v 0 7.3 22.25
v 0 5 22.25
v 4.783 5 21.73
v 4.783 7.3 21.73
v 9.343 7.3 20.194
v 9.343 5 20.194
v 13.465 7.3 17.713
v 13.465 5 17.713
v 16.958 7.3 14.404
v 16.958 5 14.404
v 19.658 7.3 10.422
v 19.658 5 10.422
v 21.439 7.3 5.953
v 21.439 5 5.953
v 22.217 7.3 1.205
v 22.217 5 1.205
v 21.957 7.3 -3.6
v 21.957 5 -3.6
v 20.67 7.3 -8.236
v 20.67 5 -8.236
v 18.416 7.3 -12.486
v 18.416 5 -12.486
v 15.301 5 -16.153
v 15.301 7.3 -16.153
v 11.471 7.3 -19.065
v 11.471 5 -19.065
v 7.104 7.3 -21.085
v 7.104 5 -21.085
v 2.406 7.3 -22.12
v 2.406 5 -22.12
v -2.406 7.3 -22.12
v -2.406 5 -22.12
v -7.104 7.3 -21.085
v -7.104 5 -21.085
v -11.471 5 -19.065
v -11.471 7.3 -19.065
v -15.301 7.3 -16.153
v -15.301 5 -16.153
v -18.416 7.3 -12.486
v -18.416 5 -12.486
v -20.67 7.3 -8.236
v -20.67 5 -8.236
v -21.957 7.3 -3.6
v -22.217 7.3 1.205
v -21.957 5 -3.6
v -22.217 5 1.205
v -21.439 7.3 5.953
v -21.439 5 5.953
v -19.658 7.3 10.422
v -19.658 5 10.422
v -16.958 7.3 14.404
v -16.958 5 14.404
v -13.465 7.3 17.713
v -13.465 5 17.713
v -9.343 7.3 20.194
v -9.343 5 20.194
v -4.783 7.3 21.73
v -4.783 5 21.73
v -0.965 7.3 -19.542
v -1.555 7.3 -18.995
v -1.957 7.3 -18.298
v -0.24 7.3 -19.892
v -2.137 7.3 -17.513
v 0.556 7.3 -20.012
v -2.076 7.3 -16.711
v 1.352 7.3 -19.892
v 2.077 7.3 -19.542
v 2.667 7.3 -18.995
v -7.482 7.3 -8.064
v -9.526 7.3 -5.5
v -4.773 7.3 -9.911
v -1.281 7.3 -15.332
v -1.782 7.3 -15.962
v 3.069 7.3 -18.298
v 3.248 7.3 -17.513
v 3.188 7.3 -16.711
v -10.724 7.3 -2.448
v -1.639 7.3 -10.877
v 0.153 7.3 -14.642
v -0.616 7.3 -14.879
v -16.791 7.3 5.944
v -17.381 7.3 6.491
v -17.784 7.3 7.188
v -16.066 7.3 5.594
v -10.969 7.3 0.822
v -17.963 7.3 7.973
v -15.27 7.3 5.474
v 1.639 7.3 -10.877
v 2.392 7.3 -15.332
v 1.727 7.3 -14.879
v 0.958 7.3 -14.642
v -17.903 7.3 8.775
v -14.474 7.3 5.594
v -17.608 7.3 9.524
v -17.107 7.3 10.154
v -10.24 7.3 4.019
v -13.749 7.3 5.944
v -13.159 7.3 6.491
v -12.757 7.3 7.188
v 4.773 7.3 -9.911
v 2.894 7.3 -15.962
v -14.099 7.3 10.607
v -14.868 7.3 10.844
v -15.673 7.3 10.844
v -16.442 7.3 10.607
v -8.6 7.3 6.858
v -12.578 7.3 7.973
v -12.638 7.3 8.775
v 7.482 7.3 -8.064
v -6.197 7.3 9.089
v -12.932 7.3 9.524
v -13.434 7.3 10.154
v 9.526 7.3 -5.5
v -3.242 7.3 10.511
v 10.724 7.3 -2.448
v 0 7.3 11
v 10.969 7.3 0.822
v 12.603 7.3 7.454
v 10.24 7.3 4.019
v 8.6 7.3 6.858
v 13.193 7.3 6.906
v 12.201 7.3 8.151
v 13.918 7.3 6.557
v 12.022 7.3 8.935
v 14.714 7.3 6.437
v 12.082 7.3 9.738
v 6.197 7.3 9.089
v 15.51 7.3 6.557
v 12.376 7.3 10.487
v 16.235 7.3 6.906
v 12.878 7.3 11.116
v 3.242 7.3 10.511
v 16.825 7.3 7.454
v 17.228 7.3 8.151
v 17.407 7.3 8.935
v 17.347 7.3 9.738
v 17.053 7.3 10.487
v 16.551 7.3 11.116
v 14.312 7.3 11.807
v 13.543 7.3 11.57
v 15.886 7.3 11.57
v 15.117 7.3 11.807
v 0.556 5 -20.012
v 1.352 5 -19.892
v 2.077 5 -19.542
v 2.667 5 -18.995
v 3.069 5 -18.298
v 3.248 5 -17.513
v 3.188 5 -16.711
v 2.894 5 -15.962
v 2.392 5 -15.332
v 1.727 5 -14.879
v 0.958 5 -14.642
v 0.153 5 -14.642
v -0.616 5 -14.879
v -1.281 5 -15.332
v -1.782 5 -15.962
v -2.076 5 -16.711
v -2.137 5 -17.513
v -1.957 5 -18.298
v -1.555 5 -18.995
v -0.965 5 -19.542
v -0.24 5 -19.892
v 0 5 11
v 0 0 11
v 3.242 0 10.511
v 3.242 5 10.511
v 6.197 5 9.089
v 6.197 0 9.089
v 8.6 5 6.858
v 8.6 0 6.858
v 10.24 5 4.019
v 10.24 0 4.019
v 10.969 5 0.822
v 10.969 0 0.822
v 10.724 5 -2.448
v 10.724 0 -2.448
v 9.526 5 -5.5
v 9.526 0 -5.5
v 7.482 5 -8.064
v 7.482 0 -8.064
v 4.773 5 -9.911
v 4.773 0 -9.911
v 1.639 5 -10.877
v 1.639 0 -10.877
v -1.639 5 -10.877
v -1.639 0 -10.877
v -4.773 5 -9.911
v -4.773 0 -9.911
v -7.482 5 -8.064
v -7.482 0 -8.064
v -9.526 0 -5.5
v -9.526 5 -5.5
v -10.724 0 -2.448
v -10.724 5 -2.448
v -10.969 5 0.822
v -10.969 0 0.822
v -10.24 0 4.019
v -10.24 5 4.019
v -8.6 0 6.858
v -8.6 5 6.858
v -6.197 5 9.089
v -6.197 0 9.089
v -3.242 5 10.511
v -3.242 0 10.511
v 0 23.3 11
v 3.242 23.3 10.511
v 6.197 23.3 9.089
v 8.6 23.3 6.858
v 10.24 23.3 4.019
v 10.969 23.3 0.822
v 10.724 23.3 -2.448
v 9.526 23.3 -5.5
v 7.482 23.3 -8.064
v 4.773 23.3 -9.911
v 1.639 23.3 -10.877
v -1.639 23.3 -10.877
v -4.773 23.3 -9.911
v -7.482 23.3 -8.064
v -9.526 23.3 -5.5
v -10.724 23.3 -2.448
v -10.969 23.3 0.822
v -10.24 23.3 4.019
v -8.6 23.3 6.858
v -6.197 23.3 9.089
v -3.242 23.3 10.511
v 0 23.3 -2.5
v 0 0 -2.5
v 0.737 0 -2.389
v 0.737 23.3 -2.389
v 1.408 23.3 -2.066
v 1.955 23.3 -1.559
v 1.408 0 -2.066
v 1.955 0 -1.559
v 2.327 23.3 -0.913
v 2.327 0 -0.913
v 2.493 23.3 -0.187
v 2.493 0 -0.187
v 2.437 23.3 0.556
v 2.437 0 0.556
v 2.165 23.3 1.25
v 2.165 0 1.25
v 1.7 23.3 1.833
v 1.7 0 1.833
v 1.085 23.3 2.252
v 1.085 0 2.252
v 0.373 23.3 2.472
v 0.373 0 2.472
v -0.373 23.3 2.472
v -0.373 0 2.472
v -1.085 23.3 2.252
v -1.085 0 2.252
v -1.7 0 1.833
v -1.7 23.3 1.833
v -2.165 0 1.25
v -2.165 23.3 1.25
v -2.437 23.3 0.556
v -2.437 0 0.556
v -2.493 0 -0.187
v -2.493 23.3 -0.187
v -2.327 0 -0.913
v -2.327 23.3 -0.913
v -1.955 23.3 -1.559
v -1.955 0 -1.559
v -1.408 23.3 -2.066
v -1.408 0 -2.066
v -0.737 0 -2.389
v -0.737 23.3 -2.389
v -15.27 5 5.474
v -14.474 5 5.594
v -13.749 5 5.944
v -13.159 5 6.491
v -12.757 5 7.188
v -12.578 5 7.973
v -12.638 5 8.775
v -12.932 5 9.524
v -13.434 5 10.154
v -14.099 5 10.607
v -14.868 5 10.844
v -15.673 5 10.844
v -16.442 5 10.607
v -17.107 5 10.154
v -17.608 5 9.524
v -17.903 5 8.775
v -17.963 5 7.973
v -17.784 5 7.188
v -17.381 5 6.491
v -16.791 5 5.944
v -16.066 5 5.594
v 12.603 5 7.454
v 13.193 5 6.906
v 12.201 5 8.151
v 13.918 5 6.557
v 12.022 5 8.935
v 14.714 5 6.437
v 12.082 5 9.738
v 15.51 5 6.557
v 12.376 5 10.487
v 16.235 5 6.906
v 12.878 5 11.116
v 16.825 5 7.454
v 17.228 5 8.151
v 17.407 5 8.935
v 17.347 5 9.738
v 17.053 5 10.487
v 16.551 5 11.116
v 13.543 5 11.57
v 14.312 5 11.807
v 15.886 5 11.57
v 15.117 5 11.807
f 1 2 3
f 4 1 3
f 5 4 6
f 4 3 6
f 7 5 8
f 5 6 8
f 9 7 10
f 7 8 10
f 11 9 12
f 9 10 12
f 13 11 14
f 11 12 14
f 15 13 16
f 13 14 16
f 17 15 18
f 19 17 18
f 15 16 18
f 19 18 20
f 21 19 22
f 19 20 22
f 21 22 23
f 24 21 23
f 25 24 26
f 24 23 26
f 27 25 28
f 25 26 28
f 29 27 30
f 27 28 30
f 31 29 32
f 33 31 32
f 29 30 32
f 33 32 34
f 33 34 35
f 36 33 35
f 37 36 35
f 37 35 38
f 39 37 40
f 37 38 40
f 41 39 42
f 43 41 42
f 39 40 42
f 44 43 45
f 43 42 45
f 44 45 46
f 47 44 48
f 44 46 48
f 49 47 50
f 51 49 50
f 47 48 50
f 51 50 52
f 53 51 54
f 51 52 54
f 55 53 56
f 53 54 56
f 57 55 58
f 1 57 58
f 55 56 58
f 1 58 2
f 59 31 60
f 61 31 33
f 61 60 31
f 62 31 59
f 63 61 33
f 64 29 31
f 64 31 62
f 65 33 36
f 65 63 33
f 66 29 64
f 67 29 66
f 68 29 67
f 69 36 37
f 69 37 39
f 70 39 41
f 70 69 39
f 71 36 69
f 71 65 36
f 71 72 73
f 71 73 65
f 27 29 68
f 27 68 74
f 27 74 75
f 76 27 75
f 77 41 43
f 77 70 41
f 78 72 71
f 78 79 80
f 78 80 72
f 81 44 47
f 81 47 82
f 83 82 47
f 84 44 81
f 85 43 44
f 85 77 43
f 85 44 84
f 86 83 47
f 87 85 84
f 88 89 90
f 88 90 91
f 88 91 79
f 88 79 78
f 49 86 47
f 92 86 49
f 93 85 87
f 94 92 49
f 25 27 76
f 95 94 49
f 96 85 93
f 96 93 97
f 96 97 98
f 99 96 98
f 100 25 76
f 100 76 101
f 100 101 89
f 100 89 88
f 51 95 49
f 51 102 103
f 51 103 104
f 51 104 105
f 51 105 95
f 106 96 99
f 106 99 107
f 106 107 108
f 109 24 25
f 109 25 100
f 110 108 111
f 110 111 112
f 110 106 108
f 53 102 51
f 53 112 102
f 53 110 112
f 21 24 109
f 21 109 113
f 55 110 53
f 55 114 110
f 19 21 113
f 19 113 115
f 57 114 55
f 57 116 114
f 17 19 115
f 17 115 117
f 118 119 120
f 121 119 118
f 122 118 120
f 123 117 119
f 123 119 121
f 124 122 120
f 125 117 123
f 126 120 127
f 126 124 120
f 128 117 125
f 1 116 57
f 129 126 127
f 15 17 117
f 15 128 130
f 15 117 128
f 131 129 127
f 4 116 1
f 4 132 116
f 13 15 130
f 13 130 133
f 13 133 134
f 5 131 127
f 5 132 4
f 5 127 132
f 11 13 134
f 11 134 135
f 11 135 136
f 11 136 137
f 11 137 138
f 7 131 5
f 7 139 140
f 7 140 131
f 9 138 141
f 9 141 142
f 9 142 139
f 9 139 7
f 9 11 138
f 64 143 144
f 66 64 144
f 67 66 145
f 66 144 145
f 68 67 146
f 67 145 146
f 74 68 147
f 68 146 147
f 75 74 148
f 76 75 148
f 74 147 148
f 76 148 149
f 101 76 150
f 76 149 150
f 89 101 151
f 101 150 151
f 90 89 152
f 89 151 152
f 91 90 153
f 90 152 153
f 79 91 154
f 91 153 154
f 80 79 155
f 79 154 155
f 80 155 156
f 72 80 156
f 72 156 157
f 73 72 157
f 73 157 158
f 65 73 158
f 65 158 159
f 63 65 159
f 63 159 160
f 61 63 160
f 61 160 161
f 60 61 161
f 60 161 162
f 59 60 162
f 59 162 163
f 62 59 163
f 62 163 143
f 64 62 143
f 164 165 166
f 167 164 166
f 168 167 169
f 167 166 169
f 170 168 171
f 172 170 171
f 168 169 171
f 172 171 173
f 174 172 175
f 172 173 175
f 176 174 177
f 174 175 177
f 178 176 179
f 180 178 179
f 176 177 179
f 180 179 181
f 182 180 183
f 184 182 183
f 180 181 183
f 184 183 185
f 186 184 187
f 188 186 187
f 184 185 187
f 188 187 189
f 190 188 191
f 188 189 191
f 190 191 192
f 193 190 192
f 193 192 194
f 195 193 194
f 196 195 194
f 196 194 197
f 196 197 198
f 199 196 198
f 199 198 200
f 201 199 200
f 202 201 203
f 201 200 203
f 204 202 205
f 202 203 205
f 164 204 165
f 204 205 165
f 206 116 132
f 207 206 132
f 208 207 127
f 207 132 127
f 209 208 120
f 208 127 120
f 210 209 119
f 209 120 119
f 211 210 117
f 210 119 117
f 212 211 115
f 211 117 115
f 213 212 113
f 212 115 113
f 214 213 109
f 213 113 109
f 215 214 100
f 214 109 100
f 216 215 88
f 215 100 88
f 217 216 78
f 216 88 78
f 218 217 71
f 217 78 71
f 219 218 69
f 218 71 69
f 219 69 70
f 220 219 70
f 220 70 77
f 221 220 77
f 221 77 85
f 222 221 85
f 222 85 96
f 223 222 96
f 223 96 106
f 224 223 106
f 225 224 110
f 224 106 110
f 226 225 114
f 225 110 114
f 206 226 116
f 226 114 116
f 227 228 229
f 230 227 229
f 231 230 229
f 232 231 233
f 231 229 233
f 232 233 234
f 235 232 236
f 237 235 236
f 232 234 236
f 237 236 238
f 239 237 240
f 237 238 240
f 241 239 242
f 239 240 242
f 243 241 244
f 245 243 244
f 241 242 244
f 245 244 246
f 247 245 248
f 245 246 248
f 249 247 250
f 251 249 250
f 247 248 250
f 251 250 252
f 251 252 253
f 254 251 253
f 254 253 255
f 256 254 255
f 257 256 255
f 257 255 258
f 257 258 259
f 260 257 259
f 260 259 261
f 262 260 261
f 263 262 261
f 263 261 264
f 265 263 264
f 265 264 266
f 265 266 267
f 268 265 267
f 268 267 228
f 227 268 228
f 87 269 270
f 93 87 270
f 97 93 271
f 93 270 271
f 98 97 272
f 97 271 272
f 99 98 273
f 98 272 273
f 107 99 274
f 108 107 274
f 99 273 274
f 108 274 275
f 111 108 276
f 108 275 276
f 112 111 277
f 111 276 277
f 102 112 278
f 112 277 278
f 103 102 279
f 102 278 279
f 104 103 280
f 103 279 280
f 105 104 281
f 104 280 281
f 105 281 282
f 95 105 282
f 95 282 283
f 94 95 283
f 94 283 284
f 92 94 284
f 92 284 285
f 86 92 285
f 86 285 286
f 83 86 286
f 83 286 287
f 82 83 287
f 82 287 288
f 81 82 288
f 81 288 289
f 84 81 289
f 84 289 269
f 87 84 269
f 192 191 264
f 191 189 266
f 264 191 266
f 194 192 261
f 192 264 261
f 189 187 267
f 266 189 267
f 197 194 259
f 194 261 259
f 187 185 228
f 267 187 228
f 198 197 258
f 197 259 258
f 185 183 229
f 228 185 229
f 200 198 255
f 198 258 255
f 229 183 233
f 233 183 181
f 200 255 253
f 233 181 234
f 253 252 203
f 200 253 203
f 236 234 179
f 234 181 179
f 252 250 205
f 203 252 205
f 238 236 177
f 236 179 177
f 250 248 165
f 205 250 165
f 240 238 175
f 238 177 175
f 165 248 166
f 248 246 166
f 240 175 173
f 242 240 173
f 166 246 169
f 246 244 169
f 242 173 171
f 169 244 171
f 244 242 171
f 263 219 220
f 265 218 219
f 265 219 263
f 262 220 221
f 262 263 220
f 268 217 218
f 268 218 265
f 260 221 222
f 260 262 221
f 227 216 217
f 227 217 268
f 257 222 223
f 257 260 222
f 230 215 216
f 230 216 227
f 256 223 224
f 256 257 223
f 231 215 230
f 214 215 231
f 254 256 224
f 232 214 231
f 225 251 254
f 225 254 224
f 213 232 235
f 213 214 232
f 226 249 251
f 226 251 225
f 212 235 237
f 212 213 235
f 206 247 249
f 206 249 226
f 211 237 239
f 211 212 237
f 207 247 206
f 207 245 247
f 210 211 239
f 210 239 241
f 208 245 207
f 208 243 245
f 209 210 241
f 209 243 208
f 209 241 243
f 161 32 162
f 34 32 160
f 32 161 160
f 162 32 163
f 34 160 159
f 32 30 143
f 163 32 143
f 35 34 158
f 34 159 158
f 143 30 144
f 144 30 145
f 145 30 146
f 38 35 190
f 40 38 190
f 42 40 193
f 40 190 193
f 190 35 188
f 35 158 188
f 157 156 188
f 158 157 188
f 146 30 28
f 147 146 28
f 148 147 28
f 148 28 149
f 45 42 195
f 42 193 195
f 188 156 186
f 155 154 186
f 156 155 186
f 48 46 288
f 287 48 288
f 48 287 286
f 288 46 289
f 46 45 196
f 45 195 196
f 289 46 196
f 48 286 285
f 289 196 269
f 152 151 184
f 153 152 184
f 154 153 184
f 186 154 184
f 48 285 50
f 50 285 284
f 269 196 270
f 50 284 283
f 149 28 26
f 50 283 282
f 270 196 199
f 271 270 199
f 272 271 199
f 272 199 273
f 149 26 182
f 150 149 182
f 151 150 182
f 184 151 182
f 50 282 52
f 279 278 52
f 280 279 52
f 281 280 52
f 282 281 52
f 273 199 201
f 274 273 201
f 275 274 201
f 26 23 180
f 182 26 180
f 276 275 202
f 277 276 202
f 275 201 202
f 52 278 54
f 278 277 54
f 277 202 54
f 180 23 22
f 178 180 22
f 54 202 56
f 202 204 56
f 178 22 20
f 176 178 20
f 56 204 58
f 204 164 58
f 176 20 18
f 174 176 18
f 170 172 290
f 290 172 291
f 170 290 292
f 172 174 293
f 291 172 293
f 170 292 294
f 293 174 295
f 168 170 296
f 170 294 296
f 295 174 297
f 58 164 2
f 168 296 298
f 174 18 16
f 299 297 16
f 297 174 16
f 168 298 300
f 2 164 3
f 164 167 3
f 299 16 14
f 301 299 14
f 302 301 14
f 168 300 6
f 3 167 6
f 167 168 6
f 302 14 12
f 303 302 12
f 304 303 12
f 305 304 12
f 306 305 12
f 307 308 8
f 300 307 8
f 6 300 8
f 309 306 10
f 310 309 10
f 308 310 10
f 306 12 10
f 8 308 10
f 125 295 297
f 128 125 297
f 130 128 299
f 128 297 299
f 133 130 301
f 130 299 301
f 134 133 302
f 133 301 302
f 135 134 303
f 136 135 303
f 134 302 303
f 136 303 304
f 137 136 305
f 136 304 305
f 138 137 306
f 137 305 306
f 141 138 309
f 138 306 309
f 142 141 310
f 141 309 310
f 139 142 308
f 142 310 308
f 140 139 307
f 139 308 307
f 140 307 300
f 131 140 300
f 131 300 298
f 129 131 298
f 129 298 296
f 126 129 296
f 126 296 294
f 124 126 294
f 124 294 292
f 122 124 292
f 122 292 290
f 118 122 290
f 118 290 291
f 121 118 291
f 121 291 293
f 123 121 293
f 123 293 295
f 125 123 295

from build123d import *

# Parameters (mm, degrees)
SKETCH1_R           = 11
BOSS_EXTRUDE1_DEPTH = 5
SKETCH2_R           = 22.25
BOSS_EXTRUDE2_DEPTH = 2.3
SKETCH3_R           = 11
BOSS_EXTRUDE3_DEPTH = 16
SKETCH4_R           = 2.5
CUT_EXTRUDE1_DEPTH  = 30
SKETCH5_R           = 2.7
CUT_EXTRUDE2_DEPTH  = 16


with BuildPart() as part:
    # Sketch1 → Boss-Extrude1 (new body)
    with BuildSketch(Plane(origin=(0, 0, 0), x_dir=(1, 0, 0), z_dir=(0, 1, 0))):
        with Locations(Location((0, 0, 0), (0, 0, 270))):
            Circle(SKETCH1_R)
    extrude(amount=BOSS_EXTRUDE1_DEPTH)

    # Sketch2 → Boss-Extrude2 (add)
    with BuildSketch(Plane(origin=(0, 5, 0), x_dir=(1, 0, 0), z_dir=(0, 1, 0))):
        with Locations(Location((0, 0, 0), (0, 0, 270))):
            Circle(SKETCH2_R)
    extrude(amount=BOSS_EXTRUDE2_DEPTH)

    # Sketch3 → Boss-Extrude3 (add)
    with BuildSketch(Plane(origin=(0, 7.3, 0), x_dir=(1, 0, 0), z_dir=(0, 1, 0))):
        with Locations(Location((0, 0, 0), (0, 0, 270))):
            Circle(SKETCH3_R)
    extrude(amount=BOSS_EXTRUDE3_DEPTH)

    # Sketch4 → Cut-Extrude1 (cut)
    with BuildSketch(Plane.XZ):
        with Locations(Location((0, 0, 0), (0, 0, 270))):
            Circle(SKETCH4_R)
    extrude(amount=-CUT_EXTRUDE1_DEPTH, mode=Mode.SUBTRACT)

    # Sketch5 → Cut-Extrude2 (cut)
    with BuildSketch(Plane.XZ.offset(-5)):
        with Locations(Location((-15.270211919, 8.174388537, 0), (0, 0, 270))):
            Circle(SKETCH5_R)
        with Locations(Location((14.714334093, 9.137197175, 0), (0, 0, 270))):
            Circle(SKETCH5_R)
        with Locations(Location((0.555877826, -17.311585711, 0), (0, 0, 270))):
            Circle(SKETCH5_R)
    extrude(amount=-CUT_EXTRUDE2_DEPTH, mode=Mode.SUBTRACT)


solid = part.part
